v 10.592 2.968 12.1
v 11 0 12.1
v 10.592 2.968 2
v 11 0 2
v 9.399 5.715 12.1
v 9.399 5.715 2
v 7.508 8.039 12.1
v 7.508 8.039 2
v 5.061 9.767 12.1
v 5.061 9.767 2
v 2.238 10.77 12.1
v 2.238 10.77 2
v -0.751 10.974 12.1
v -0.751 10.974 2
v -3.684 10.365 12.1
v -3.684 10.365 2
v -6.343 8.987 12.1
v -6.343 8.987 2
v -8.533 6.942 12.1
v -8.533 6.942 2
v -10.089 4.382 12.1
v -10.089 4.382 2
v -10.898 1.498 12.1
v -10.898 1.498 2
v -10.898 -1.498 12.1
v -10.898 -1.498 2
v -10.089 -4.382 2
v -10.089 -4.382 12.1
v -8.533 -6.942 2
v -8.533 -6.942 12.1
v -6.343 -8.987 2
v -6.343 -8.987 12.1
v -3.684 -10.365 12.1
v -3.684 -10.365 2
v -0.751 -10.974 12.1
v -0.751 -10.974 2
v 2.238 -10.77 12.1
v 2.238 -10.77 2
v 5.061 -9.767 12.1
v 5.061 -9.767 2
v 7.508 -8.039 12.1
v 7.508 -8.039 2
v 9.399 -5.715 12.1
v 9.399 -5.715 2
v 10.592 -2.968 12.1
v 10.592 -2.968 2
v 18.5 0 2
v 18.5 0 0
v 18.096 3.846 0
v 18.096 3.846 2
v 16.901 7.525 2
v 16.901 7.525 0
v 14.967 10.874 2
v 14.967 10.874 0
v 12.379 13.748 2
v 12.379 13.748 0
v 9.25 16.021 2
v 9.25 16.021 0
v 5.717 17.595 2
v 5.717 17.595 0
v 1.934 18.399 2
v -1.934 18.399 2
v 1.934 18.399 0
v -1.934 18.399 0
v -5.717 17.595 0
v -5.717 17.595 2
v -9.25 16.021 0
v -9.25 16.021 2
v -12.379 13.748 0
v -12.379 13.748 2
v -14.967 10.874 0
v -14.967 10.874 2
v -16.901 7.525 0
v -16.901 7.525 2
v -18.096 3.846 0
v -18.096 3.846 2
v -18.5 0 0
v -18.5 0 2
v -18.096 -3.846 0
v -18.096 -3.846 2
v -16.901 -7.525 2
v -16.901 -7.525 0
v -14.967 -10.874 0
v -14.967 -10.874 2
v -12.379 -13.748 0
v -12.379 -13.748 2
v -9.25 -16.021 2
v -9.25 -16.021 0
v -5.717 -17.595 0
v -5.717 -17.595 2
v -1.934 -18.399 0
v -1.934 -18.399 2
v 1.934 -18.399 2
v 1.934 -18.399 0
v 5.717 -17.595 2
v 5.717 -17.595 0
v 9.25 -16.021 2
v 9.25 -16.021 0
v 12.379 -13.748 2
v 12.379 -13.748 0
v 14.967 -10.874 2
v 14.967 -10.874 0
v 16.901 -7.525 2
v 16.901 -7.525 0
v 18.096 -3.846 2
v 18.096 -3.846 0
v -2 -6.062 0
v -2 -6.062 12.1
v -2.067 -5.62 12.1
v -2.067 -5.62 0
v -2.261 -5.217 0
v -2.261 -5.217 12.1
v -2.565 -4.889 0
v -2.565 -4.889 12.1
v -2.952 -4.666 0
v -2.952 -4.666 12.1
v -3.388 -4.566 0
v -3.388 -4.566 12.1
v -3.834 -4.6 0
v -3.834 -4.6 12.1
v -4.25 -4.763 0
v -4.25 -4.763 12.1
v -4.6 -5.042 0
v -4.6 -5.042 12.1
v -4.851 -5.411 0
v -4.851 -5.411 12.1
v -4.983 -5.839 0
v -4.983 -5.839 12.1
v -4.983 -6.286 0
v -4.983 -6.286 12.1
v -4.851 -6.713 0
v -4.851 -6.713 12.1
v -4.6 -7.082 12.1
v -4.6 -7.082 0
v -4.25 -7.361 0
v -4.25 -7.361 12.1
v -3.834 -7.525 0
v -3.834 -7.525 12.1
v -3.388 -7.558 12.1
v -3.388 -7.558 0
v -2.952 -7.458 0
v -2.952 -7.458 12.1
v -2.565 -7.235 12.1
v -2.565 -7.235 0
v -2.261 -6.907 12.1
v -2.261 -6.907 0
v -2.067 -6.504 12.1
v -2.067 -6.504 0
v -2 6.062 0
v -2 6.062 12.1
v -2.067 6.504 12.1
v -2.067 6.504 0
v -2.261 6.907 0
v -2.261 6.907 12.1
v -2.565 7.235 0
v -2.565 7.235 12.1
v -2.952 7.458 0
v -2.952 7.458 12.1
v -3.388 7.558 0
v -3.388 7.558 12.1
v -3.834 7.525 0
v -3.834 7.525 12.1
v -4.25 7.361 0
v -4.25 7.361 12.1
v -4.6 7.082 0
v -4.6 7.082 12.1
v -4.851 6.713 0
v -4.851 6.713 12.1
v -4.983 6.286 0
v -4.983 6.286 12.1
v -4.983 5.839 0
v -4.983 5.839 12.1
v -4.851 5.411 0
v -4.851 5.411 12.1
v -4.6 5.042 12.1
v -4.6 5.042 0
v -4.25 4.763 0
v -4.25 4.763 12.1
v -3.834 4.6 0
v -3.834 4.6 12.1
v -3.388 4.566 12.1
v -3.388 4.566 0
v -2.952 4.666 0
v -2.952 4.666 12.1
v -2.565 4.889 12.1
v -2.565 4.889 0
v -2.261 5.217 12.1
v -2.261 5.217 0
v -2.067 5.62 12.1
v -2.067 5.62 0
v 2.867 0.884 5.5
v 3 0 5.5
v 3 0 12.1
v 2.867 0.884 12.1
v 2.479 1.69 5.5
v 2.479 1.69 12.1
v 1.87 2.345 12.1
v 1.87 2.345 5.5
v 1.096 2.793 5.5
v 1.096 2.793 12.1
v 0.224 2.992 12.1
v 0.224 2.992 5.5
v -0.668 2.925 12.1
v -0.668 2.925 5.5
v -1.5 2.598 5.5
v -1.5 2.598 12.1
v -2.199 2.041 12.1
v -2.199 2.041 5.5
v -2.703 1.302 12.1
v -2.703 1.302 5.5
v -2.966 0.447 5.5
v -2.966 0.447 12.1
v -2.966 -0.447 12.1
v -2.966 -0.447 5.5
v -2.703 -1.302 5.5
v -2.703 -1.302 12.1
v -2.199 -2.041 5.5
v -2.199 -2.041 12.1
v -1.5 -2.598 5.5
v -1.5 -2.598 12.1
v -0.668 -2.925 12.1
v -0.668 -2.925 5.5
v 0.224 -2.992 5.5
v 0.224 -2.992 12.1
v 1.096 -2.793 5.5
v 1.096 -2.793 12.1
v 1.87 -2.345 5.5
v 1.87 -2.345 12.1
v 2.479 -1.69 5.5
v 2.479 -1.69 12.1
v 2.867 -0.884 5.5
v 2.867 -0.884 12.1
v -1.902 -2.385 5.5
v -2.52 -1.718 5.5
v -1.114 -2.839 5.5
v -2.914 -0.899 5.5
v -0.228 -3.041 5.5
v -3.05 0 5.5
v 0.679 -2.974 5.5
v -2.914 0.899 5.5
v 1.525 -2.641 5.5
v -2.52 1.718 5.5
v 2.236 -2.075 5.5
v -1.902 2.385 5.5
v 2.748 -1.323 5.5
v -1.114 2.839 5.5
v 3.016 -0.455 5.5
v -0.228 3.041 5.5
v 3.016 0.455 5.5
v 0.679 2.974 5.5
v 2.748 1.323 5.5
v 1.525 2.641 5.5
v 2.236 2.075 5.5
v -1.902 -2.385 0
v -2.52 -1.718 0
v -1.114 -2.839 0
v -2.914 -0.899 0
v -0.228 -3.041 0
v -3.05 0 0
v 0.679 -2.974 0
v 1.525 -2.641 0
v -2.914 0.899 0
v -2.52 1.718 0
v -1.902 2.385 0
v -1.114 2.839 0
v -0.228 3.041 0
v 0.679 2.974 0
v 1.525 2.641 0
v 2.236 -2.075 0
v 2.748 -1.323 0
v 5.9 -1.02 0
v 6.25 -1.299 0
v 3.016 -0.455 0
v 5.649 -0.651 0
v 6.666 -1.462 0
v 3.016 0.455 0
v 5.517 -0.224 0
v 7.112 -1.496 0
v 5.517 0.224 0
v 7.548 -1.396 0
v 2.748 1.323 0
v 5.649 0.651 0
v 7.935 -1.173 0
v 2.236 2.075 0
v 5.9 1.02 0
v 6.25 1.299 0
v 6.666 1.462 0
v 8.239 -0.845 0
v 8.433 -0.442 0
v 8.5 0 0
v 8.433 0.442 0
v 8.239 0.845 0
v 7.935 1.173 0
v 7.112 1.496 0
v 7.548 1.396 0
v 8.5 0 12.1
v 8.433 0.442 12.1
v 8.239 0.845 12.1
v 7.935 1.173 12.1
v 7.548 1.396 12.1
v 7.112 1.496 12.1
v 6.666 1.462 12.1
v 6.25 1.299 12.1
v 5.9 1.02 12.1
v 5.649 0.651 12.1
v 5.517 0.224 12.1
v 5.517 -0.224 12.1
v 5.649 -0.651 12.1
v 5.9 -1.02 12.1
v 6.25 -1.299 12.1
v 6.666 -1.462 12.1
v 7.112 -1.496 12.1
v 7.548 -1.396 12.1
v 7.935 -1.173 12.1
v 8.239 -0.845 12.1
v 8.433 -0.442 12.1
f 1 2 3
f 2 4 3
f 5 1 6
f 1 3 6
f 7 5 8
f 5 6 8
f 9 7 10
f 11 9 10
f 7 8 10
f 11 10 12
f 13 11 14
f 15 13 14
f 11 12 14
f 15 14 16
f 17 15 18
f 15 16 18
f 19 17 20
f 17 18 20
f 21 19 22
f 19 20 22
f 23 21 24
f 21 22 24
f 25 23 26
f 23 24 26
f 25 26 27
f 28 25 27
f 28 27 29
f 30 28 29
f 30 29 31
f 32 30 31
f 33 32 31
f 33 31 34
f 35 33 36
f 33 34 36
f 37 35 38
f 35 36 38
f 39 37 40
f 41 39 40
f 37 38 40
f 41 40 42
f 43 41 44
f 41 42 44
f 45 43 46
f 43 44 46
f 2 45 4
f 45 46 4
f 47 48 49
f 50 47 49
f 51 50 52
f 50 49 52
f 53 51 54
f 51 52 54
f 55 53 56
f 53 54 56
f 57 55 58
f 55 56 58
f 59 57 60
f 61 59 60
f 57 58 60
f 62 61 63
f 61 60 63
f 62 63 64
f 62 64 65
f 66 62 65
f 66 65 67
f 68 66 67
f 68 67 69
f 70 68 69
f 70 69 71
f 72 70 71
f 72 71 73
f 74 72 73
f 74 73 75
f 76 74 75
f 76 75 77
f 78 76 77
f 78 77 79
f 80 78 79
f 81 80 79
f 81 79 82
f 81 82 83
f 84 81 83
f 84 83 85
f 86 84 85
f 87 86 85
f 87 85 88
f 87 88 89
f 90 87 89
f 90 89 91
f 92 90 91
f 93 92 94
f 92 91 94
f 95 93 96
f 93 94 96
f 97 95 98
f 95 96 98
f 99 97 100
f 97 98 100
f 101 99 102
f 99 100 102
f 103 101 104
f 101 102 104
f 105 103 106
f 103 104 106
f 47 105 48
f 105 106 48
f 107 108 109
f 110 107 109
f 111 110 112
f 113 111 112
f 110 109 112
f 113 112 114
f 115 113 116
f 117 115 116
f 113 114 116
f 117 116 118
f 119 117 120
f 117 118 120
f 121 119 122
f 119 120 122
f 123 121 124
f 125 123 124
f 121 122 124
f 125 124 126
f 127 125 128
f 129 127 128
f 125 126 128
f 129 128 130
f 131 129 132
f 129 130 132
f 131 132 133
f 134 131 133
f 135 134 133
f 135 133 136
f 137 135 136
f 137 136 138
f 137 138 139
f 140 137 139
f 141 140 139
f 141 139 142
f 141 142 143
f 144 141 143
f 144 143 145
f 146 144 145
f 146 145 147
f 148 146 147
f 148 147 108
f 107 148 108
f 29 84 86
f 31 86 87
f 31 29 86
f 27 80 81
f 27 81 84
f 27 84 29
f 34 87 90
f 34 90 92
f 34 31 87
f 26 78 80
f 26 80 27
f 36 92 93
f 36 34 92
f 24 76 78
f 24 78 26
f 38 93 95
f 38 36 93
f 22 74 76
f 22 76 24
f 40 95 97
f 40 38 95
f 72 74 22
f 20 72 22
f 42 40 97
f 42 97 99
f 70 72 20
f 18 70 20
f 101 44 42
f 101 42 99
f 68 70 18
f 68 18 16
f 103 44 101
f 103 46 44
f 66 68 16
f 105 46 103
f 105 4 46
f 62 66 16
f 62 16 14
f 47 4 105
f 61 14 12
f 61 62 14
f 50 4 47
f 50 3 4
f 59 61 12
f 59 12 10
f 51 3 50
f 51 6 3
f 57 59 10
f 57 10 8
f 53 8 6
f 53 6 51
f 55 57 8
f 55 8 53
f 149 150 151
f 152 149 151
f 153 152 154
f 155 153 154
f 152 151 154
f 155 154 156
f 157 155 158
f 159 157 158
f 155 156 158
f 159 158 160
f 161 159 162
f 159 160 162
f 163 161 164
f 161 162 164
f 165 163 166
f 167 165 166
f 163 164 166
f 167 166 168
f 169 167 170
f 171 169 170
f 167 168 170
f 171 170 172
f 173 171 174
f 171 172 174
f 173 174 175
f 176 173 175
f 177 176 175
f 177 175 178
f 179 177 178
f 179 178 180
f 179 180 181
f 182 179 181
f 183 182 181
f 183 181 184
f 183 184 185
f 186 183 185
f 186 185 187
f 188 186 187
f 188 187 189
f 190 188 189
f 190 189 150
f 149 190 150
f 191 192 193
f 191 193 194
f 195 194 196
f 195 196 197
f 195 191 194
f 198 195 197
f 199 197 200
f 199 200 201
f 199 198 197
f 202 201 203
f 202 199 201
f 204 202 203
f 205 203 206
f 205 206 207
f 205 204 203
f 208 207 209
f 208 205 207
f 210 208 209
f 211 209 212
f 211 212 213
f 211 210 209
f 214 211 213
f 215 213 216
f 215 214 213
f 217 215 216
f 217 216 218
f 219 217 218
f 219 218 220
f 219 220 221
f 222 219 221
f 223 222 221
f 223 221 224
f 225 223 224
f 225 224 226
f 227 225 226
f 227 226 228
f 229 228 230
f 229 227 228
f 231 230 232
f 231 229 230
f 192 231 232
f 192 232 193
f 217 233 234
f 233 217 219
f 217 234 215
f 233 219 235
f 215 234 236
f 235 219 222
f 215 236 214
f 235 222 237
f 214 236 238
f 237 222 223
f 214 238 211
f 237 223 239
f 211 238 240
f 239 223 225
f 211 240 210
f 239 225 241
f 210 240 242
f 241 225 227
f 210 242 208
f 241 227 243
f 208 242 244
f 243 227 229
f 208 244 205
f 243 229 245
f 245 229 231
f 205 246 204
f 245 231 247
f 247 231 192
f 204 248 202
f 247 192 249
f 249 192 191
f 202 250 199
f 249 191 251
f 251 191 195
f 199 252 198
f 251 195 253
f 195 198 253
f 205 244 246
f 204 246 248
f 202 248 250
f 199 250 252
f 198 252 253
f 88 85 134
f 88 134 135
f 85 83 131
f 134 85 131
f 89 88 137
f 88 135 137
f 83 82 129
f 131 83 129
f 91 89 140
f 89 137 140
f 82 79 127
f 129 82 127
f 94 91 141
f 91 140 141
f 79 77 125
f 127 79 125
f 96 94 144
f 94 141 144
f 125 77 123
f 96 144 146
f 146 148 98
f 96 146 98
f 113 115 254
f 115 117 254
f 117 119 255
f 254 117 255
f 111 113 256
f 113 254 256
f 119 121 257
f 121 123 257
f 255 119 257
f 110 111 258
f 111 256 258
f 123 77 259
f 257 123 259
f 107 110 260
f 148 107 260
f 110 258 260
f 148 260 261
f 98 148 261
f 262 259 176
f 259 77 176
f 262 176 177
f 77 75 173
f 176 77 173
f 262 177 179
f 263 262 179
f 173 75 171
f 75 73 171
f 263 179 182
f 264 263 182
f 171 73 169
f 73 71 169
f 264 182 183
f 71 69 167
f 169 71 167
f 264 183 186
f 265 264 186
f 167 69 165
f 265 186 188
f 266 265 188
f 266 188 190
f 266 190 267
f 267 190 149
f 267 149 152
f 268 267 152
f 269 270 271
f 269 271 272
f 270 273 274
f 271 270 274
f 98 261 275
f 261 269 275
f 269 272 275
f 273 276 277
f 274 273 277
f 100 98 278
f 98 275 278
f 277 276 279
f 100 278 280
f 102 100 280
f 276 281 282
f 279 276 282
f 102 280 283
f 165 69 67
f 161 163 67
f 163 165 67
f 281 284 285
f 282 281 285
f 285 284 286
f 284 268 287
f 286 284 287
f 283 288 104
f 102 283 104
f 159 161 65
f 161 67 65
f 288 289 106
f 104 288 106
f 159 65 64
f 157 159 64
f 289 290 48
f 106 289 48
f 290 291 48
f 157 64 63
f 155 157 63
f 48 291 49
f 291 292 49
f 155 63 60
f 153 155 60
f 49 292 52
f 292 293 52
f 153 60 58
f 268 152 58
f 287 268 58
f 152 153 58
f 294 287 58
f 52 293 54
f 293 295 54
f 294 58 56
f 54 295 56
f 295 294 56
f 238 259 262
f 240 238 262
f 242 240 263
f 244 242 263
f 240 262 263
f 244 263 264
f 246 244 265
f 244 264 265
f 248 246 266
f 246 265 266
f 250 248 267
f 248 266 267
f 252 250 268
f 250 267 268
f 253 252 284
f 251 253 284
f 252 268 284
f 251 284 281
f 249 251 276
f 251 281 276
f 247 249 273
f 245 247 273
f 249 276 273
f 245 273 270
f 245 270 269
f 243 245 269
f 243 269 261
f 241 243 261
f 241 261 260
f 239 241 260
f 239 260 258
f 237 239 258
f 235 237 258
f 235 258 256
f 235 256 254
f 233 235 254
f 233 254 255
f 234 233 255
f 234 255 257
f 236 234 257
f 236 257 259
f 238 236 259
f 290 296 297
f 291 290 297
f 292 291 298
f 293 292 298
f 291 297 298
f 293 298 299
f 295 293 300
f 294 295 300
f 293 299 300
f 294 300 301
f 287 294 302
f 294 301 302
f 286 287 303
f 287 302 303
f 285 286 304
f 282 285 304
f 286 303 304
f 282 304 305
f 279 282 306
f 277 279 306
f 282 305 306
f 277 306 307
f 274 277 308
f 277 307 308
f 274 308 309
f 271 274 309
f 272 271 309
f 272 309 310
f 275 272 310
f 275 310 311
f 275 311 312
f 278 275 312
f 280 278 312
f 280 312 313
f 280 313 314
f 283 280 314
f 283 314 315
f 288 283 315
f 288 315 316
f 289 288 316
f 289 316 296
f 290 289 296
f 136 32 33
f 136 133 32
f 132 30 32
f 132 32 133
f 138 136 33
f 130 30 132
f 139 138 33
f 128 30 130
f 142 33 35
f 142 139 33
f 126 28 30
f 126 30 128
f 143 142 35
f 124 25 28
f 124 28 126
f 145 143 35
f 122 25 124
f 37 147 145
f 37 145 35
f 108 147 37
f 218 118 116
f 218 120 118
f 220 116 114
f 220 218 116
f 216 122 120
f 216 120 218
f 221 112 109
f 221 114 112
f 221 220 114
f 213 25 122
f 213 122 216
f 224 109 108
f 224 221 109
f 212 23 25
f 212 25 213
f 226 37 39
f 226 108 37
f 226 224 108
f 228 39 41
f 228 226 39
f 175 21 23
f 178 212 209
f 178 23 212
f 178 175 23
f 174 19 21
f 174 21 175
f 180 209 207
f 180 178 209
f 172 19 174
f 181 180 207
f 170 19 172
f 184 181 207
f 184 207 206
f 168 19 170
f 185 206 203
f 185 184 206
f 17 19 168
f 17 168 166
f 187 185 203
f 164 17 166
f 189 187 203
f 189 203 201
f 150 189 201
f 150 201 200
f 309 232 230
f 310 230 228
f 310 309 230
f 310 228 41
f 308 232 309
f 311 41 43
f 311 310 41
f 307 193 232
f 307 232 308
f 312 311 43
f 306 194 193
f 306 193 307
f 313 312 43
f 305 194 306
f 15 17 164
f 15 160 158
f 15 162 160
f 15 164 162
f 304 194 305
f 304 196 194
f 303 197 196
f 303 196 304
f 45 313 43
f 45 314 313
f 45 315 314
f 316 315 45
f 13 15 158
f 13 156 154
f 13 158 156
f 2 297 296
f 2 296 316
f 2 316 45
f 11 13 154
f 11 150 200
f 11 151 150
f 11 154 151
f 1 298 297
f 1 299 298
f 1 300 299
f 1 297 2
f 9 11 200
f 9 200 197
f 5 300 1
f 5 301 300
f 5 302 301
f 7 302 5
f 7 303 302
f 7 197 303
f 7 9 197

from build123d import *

# Parameters (mm, degrees)
SKETCH1_R           = 18.5
BOSS_EXTRUDE1_DEPTH = 3
SKETCH2_R           = 11
BOSS_EXTRUDE2_DEPTH = 2.5
SKETCH4_R           = 3.05
CUT_EXTRUDE1_DEPTH  = 27.734808771
SKETCH7_R           = 11
SKETCH7_R_2         = 3
BOSS_EXTRUDE3_DEPTH = 6.6
SKETCH9_R           = 1.5
CUT_EXTRUDE4_DEPTH  = 29.825509536
CUT_EXTRUDE5_START  = -1
SKETCH10_R          = 18.5
SKETCH10_R_2        = 11
CUT_EXTRUDE5_DEPTH  = 1


with BuildPart() as part:
    # Sketch1 → Boss-Extrude1 (new body)
    with BuildSketch(Plane.XY):
        Circle(SKETCH1_R)
    extrude(amount=BOSS_EXTRUDE1_DEPTH)

    # Sketch2 → Boss-Extrude2 (add)
    with BuildSketch(Plane.XY.offset(3)):
        Circle(SKETCH2_R)
    extrude(amount=BOSS_EXTRUDE2_DEPTH)

    # Sketch4 → Cut-Extrude1 (cut, through all)
    with BuildSketch(Plane(origin=(0, 0, 0), x_dir=(-1, 0, 0), z_dir=(0, 0, -1))):
        Circle(SKETCH4_R)
    extrude(amount=-CUT_EXTRUDE1_DEPTH, mode=Mode.SUBTRACT)

    # Sketch7 → Boss-Extrude3 (add)
    with BuildSketch(Plane.XY.offset(5.5)):
        Circle(SKETCH7_R)
        Circle(SKETCH7_R_2, mode=Mode.SUBTRACT)
    extrude(amount=BOSS_EXTRUDE3_DEPTH)

    # Sketch9 → Cut-Extrude4 (cut, through all)
    with BuildSketch(Plane.XY.offset(12.1)):
        with Locations((7, 0)):
            Circle(SKETCH9_R)
        with Locations((-3.5, -6.062177826)):
            Circle(SKETCH9_R)
        with Locations((-3.5, 6.062177826)):
            Circle(SKETCH9_R)
    extrude(amount=-CUT_EXTRUDE4_DEPTH, mode=Mode.SUBTRACT)

    # Sketch10 → Cut-Extrude5 (cut)
    with BuildSketch(Plane.XY.offset(3).offset(CUT_EXTRUDE5_START)):
        Circle(SKETCH10_R)
        Circle(SKETCH10_R_2, mode=Mode.SUBTRACT)
    extrude(amount=CUT_EXTRUDE5_DEPTH, mode=Mode.SUBTRACT)


solid = part.part
